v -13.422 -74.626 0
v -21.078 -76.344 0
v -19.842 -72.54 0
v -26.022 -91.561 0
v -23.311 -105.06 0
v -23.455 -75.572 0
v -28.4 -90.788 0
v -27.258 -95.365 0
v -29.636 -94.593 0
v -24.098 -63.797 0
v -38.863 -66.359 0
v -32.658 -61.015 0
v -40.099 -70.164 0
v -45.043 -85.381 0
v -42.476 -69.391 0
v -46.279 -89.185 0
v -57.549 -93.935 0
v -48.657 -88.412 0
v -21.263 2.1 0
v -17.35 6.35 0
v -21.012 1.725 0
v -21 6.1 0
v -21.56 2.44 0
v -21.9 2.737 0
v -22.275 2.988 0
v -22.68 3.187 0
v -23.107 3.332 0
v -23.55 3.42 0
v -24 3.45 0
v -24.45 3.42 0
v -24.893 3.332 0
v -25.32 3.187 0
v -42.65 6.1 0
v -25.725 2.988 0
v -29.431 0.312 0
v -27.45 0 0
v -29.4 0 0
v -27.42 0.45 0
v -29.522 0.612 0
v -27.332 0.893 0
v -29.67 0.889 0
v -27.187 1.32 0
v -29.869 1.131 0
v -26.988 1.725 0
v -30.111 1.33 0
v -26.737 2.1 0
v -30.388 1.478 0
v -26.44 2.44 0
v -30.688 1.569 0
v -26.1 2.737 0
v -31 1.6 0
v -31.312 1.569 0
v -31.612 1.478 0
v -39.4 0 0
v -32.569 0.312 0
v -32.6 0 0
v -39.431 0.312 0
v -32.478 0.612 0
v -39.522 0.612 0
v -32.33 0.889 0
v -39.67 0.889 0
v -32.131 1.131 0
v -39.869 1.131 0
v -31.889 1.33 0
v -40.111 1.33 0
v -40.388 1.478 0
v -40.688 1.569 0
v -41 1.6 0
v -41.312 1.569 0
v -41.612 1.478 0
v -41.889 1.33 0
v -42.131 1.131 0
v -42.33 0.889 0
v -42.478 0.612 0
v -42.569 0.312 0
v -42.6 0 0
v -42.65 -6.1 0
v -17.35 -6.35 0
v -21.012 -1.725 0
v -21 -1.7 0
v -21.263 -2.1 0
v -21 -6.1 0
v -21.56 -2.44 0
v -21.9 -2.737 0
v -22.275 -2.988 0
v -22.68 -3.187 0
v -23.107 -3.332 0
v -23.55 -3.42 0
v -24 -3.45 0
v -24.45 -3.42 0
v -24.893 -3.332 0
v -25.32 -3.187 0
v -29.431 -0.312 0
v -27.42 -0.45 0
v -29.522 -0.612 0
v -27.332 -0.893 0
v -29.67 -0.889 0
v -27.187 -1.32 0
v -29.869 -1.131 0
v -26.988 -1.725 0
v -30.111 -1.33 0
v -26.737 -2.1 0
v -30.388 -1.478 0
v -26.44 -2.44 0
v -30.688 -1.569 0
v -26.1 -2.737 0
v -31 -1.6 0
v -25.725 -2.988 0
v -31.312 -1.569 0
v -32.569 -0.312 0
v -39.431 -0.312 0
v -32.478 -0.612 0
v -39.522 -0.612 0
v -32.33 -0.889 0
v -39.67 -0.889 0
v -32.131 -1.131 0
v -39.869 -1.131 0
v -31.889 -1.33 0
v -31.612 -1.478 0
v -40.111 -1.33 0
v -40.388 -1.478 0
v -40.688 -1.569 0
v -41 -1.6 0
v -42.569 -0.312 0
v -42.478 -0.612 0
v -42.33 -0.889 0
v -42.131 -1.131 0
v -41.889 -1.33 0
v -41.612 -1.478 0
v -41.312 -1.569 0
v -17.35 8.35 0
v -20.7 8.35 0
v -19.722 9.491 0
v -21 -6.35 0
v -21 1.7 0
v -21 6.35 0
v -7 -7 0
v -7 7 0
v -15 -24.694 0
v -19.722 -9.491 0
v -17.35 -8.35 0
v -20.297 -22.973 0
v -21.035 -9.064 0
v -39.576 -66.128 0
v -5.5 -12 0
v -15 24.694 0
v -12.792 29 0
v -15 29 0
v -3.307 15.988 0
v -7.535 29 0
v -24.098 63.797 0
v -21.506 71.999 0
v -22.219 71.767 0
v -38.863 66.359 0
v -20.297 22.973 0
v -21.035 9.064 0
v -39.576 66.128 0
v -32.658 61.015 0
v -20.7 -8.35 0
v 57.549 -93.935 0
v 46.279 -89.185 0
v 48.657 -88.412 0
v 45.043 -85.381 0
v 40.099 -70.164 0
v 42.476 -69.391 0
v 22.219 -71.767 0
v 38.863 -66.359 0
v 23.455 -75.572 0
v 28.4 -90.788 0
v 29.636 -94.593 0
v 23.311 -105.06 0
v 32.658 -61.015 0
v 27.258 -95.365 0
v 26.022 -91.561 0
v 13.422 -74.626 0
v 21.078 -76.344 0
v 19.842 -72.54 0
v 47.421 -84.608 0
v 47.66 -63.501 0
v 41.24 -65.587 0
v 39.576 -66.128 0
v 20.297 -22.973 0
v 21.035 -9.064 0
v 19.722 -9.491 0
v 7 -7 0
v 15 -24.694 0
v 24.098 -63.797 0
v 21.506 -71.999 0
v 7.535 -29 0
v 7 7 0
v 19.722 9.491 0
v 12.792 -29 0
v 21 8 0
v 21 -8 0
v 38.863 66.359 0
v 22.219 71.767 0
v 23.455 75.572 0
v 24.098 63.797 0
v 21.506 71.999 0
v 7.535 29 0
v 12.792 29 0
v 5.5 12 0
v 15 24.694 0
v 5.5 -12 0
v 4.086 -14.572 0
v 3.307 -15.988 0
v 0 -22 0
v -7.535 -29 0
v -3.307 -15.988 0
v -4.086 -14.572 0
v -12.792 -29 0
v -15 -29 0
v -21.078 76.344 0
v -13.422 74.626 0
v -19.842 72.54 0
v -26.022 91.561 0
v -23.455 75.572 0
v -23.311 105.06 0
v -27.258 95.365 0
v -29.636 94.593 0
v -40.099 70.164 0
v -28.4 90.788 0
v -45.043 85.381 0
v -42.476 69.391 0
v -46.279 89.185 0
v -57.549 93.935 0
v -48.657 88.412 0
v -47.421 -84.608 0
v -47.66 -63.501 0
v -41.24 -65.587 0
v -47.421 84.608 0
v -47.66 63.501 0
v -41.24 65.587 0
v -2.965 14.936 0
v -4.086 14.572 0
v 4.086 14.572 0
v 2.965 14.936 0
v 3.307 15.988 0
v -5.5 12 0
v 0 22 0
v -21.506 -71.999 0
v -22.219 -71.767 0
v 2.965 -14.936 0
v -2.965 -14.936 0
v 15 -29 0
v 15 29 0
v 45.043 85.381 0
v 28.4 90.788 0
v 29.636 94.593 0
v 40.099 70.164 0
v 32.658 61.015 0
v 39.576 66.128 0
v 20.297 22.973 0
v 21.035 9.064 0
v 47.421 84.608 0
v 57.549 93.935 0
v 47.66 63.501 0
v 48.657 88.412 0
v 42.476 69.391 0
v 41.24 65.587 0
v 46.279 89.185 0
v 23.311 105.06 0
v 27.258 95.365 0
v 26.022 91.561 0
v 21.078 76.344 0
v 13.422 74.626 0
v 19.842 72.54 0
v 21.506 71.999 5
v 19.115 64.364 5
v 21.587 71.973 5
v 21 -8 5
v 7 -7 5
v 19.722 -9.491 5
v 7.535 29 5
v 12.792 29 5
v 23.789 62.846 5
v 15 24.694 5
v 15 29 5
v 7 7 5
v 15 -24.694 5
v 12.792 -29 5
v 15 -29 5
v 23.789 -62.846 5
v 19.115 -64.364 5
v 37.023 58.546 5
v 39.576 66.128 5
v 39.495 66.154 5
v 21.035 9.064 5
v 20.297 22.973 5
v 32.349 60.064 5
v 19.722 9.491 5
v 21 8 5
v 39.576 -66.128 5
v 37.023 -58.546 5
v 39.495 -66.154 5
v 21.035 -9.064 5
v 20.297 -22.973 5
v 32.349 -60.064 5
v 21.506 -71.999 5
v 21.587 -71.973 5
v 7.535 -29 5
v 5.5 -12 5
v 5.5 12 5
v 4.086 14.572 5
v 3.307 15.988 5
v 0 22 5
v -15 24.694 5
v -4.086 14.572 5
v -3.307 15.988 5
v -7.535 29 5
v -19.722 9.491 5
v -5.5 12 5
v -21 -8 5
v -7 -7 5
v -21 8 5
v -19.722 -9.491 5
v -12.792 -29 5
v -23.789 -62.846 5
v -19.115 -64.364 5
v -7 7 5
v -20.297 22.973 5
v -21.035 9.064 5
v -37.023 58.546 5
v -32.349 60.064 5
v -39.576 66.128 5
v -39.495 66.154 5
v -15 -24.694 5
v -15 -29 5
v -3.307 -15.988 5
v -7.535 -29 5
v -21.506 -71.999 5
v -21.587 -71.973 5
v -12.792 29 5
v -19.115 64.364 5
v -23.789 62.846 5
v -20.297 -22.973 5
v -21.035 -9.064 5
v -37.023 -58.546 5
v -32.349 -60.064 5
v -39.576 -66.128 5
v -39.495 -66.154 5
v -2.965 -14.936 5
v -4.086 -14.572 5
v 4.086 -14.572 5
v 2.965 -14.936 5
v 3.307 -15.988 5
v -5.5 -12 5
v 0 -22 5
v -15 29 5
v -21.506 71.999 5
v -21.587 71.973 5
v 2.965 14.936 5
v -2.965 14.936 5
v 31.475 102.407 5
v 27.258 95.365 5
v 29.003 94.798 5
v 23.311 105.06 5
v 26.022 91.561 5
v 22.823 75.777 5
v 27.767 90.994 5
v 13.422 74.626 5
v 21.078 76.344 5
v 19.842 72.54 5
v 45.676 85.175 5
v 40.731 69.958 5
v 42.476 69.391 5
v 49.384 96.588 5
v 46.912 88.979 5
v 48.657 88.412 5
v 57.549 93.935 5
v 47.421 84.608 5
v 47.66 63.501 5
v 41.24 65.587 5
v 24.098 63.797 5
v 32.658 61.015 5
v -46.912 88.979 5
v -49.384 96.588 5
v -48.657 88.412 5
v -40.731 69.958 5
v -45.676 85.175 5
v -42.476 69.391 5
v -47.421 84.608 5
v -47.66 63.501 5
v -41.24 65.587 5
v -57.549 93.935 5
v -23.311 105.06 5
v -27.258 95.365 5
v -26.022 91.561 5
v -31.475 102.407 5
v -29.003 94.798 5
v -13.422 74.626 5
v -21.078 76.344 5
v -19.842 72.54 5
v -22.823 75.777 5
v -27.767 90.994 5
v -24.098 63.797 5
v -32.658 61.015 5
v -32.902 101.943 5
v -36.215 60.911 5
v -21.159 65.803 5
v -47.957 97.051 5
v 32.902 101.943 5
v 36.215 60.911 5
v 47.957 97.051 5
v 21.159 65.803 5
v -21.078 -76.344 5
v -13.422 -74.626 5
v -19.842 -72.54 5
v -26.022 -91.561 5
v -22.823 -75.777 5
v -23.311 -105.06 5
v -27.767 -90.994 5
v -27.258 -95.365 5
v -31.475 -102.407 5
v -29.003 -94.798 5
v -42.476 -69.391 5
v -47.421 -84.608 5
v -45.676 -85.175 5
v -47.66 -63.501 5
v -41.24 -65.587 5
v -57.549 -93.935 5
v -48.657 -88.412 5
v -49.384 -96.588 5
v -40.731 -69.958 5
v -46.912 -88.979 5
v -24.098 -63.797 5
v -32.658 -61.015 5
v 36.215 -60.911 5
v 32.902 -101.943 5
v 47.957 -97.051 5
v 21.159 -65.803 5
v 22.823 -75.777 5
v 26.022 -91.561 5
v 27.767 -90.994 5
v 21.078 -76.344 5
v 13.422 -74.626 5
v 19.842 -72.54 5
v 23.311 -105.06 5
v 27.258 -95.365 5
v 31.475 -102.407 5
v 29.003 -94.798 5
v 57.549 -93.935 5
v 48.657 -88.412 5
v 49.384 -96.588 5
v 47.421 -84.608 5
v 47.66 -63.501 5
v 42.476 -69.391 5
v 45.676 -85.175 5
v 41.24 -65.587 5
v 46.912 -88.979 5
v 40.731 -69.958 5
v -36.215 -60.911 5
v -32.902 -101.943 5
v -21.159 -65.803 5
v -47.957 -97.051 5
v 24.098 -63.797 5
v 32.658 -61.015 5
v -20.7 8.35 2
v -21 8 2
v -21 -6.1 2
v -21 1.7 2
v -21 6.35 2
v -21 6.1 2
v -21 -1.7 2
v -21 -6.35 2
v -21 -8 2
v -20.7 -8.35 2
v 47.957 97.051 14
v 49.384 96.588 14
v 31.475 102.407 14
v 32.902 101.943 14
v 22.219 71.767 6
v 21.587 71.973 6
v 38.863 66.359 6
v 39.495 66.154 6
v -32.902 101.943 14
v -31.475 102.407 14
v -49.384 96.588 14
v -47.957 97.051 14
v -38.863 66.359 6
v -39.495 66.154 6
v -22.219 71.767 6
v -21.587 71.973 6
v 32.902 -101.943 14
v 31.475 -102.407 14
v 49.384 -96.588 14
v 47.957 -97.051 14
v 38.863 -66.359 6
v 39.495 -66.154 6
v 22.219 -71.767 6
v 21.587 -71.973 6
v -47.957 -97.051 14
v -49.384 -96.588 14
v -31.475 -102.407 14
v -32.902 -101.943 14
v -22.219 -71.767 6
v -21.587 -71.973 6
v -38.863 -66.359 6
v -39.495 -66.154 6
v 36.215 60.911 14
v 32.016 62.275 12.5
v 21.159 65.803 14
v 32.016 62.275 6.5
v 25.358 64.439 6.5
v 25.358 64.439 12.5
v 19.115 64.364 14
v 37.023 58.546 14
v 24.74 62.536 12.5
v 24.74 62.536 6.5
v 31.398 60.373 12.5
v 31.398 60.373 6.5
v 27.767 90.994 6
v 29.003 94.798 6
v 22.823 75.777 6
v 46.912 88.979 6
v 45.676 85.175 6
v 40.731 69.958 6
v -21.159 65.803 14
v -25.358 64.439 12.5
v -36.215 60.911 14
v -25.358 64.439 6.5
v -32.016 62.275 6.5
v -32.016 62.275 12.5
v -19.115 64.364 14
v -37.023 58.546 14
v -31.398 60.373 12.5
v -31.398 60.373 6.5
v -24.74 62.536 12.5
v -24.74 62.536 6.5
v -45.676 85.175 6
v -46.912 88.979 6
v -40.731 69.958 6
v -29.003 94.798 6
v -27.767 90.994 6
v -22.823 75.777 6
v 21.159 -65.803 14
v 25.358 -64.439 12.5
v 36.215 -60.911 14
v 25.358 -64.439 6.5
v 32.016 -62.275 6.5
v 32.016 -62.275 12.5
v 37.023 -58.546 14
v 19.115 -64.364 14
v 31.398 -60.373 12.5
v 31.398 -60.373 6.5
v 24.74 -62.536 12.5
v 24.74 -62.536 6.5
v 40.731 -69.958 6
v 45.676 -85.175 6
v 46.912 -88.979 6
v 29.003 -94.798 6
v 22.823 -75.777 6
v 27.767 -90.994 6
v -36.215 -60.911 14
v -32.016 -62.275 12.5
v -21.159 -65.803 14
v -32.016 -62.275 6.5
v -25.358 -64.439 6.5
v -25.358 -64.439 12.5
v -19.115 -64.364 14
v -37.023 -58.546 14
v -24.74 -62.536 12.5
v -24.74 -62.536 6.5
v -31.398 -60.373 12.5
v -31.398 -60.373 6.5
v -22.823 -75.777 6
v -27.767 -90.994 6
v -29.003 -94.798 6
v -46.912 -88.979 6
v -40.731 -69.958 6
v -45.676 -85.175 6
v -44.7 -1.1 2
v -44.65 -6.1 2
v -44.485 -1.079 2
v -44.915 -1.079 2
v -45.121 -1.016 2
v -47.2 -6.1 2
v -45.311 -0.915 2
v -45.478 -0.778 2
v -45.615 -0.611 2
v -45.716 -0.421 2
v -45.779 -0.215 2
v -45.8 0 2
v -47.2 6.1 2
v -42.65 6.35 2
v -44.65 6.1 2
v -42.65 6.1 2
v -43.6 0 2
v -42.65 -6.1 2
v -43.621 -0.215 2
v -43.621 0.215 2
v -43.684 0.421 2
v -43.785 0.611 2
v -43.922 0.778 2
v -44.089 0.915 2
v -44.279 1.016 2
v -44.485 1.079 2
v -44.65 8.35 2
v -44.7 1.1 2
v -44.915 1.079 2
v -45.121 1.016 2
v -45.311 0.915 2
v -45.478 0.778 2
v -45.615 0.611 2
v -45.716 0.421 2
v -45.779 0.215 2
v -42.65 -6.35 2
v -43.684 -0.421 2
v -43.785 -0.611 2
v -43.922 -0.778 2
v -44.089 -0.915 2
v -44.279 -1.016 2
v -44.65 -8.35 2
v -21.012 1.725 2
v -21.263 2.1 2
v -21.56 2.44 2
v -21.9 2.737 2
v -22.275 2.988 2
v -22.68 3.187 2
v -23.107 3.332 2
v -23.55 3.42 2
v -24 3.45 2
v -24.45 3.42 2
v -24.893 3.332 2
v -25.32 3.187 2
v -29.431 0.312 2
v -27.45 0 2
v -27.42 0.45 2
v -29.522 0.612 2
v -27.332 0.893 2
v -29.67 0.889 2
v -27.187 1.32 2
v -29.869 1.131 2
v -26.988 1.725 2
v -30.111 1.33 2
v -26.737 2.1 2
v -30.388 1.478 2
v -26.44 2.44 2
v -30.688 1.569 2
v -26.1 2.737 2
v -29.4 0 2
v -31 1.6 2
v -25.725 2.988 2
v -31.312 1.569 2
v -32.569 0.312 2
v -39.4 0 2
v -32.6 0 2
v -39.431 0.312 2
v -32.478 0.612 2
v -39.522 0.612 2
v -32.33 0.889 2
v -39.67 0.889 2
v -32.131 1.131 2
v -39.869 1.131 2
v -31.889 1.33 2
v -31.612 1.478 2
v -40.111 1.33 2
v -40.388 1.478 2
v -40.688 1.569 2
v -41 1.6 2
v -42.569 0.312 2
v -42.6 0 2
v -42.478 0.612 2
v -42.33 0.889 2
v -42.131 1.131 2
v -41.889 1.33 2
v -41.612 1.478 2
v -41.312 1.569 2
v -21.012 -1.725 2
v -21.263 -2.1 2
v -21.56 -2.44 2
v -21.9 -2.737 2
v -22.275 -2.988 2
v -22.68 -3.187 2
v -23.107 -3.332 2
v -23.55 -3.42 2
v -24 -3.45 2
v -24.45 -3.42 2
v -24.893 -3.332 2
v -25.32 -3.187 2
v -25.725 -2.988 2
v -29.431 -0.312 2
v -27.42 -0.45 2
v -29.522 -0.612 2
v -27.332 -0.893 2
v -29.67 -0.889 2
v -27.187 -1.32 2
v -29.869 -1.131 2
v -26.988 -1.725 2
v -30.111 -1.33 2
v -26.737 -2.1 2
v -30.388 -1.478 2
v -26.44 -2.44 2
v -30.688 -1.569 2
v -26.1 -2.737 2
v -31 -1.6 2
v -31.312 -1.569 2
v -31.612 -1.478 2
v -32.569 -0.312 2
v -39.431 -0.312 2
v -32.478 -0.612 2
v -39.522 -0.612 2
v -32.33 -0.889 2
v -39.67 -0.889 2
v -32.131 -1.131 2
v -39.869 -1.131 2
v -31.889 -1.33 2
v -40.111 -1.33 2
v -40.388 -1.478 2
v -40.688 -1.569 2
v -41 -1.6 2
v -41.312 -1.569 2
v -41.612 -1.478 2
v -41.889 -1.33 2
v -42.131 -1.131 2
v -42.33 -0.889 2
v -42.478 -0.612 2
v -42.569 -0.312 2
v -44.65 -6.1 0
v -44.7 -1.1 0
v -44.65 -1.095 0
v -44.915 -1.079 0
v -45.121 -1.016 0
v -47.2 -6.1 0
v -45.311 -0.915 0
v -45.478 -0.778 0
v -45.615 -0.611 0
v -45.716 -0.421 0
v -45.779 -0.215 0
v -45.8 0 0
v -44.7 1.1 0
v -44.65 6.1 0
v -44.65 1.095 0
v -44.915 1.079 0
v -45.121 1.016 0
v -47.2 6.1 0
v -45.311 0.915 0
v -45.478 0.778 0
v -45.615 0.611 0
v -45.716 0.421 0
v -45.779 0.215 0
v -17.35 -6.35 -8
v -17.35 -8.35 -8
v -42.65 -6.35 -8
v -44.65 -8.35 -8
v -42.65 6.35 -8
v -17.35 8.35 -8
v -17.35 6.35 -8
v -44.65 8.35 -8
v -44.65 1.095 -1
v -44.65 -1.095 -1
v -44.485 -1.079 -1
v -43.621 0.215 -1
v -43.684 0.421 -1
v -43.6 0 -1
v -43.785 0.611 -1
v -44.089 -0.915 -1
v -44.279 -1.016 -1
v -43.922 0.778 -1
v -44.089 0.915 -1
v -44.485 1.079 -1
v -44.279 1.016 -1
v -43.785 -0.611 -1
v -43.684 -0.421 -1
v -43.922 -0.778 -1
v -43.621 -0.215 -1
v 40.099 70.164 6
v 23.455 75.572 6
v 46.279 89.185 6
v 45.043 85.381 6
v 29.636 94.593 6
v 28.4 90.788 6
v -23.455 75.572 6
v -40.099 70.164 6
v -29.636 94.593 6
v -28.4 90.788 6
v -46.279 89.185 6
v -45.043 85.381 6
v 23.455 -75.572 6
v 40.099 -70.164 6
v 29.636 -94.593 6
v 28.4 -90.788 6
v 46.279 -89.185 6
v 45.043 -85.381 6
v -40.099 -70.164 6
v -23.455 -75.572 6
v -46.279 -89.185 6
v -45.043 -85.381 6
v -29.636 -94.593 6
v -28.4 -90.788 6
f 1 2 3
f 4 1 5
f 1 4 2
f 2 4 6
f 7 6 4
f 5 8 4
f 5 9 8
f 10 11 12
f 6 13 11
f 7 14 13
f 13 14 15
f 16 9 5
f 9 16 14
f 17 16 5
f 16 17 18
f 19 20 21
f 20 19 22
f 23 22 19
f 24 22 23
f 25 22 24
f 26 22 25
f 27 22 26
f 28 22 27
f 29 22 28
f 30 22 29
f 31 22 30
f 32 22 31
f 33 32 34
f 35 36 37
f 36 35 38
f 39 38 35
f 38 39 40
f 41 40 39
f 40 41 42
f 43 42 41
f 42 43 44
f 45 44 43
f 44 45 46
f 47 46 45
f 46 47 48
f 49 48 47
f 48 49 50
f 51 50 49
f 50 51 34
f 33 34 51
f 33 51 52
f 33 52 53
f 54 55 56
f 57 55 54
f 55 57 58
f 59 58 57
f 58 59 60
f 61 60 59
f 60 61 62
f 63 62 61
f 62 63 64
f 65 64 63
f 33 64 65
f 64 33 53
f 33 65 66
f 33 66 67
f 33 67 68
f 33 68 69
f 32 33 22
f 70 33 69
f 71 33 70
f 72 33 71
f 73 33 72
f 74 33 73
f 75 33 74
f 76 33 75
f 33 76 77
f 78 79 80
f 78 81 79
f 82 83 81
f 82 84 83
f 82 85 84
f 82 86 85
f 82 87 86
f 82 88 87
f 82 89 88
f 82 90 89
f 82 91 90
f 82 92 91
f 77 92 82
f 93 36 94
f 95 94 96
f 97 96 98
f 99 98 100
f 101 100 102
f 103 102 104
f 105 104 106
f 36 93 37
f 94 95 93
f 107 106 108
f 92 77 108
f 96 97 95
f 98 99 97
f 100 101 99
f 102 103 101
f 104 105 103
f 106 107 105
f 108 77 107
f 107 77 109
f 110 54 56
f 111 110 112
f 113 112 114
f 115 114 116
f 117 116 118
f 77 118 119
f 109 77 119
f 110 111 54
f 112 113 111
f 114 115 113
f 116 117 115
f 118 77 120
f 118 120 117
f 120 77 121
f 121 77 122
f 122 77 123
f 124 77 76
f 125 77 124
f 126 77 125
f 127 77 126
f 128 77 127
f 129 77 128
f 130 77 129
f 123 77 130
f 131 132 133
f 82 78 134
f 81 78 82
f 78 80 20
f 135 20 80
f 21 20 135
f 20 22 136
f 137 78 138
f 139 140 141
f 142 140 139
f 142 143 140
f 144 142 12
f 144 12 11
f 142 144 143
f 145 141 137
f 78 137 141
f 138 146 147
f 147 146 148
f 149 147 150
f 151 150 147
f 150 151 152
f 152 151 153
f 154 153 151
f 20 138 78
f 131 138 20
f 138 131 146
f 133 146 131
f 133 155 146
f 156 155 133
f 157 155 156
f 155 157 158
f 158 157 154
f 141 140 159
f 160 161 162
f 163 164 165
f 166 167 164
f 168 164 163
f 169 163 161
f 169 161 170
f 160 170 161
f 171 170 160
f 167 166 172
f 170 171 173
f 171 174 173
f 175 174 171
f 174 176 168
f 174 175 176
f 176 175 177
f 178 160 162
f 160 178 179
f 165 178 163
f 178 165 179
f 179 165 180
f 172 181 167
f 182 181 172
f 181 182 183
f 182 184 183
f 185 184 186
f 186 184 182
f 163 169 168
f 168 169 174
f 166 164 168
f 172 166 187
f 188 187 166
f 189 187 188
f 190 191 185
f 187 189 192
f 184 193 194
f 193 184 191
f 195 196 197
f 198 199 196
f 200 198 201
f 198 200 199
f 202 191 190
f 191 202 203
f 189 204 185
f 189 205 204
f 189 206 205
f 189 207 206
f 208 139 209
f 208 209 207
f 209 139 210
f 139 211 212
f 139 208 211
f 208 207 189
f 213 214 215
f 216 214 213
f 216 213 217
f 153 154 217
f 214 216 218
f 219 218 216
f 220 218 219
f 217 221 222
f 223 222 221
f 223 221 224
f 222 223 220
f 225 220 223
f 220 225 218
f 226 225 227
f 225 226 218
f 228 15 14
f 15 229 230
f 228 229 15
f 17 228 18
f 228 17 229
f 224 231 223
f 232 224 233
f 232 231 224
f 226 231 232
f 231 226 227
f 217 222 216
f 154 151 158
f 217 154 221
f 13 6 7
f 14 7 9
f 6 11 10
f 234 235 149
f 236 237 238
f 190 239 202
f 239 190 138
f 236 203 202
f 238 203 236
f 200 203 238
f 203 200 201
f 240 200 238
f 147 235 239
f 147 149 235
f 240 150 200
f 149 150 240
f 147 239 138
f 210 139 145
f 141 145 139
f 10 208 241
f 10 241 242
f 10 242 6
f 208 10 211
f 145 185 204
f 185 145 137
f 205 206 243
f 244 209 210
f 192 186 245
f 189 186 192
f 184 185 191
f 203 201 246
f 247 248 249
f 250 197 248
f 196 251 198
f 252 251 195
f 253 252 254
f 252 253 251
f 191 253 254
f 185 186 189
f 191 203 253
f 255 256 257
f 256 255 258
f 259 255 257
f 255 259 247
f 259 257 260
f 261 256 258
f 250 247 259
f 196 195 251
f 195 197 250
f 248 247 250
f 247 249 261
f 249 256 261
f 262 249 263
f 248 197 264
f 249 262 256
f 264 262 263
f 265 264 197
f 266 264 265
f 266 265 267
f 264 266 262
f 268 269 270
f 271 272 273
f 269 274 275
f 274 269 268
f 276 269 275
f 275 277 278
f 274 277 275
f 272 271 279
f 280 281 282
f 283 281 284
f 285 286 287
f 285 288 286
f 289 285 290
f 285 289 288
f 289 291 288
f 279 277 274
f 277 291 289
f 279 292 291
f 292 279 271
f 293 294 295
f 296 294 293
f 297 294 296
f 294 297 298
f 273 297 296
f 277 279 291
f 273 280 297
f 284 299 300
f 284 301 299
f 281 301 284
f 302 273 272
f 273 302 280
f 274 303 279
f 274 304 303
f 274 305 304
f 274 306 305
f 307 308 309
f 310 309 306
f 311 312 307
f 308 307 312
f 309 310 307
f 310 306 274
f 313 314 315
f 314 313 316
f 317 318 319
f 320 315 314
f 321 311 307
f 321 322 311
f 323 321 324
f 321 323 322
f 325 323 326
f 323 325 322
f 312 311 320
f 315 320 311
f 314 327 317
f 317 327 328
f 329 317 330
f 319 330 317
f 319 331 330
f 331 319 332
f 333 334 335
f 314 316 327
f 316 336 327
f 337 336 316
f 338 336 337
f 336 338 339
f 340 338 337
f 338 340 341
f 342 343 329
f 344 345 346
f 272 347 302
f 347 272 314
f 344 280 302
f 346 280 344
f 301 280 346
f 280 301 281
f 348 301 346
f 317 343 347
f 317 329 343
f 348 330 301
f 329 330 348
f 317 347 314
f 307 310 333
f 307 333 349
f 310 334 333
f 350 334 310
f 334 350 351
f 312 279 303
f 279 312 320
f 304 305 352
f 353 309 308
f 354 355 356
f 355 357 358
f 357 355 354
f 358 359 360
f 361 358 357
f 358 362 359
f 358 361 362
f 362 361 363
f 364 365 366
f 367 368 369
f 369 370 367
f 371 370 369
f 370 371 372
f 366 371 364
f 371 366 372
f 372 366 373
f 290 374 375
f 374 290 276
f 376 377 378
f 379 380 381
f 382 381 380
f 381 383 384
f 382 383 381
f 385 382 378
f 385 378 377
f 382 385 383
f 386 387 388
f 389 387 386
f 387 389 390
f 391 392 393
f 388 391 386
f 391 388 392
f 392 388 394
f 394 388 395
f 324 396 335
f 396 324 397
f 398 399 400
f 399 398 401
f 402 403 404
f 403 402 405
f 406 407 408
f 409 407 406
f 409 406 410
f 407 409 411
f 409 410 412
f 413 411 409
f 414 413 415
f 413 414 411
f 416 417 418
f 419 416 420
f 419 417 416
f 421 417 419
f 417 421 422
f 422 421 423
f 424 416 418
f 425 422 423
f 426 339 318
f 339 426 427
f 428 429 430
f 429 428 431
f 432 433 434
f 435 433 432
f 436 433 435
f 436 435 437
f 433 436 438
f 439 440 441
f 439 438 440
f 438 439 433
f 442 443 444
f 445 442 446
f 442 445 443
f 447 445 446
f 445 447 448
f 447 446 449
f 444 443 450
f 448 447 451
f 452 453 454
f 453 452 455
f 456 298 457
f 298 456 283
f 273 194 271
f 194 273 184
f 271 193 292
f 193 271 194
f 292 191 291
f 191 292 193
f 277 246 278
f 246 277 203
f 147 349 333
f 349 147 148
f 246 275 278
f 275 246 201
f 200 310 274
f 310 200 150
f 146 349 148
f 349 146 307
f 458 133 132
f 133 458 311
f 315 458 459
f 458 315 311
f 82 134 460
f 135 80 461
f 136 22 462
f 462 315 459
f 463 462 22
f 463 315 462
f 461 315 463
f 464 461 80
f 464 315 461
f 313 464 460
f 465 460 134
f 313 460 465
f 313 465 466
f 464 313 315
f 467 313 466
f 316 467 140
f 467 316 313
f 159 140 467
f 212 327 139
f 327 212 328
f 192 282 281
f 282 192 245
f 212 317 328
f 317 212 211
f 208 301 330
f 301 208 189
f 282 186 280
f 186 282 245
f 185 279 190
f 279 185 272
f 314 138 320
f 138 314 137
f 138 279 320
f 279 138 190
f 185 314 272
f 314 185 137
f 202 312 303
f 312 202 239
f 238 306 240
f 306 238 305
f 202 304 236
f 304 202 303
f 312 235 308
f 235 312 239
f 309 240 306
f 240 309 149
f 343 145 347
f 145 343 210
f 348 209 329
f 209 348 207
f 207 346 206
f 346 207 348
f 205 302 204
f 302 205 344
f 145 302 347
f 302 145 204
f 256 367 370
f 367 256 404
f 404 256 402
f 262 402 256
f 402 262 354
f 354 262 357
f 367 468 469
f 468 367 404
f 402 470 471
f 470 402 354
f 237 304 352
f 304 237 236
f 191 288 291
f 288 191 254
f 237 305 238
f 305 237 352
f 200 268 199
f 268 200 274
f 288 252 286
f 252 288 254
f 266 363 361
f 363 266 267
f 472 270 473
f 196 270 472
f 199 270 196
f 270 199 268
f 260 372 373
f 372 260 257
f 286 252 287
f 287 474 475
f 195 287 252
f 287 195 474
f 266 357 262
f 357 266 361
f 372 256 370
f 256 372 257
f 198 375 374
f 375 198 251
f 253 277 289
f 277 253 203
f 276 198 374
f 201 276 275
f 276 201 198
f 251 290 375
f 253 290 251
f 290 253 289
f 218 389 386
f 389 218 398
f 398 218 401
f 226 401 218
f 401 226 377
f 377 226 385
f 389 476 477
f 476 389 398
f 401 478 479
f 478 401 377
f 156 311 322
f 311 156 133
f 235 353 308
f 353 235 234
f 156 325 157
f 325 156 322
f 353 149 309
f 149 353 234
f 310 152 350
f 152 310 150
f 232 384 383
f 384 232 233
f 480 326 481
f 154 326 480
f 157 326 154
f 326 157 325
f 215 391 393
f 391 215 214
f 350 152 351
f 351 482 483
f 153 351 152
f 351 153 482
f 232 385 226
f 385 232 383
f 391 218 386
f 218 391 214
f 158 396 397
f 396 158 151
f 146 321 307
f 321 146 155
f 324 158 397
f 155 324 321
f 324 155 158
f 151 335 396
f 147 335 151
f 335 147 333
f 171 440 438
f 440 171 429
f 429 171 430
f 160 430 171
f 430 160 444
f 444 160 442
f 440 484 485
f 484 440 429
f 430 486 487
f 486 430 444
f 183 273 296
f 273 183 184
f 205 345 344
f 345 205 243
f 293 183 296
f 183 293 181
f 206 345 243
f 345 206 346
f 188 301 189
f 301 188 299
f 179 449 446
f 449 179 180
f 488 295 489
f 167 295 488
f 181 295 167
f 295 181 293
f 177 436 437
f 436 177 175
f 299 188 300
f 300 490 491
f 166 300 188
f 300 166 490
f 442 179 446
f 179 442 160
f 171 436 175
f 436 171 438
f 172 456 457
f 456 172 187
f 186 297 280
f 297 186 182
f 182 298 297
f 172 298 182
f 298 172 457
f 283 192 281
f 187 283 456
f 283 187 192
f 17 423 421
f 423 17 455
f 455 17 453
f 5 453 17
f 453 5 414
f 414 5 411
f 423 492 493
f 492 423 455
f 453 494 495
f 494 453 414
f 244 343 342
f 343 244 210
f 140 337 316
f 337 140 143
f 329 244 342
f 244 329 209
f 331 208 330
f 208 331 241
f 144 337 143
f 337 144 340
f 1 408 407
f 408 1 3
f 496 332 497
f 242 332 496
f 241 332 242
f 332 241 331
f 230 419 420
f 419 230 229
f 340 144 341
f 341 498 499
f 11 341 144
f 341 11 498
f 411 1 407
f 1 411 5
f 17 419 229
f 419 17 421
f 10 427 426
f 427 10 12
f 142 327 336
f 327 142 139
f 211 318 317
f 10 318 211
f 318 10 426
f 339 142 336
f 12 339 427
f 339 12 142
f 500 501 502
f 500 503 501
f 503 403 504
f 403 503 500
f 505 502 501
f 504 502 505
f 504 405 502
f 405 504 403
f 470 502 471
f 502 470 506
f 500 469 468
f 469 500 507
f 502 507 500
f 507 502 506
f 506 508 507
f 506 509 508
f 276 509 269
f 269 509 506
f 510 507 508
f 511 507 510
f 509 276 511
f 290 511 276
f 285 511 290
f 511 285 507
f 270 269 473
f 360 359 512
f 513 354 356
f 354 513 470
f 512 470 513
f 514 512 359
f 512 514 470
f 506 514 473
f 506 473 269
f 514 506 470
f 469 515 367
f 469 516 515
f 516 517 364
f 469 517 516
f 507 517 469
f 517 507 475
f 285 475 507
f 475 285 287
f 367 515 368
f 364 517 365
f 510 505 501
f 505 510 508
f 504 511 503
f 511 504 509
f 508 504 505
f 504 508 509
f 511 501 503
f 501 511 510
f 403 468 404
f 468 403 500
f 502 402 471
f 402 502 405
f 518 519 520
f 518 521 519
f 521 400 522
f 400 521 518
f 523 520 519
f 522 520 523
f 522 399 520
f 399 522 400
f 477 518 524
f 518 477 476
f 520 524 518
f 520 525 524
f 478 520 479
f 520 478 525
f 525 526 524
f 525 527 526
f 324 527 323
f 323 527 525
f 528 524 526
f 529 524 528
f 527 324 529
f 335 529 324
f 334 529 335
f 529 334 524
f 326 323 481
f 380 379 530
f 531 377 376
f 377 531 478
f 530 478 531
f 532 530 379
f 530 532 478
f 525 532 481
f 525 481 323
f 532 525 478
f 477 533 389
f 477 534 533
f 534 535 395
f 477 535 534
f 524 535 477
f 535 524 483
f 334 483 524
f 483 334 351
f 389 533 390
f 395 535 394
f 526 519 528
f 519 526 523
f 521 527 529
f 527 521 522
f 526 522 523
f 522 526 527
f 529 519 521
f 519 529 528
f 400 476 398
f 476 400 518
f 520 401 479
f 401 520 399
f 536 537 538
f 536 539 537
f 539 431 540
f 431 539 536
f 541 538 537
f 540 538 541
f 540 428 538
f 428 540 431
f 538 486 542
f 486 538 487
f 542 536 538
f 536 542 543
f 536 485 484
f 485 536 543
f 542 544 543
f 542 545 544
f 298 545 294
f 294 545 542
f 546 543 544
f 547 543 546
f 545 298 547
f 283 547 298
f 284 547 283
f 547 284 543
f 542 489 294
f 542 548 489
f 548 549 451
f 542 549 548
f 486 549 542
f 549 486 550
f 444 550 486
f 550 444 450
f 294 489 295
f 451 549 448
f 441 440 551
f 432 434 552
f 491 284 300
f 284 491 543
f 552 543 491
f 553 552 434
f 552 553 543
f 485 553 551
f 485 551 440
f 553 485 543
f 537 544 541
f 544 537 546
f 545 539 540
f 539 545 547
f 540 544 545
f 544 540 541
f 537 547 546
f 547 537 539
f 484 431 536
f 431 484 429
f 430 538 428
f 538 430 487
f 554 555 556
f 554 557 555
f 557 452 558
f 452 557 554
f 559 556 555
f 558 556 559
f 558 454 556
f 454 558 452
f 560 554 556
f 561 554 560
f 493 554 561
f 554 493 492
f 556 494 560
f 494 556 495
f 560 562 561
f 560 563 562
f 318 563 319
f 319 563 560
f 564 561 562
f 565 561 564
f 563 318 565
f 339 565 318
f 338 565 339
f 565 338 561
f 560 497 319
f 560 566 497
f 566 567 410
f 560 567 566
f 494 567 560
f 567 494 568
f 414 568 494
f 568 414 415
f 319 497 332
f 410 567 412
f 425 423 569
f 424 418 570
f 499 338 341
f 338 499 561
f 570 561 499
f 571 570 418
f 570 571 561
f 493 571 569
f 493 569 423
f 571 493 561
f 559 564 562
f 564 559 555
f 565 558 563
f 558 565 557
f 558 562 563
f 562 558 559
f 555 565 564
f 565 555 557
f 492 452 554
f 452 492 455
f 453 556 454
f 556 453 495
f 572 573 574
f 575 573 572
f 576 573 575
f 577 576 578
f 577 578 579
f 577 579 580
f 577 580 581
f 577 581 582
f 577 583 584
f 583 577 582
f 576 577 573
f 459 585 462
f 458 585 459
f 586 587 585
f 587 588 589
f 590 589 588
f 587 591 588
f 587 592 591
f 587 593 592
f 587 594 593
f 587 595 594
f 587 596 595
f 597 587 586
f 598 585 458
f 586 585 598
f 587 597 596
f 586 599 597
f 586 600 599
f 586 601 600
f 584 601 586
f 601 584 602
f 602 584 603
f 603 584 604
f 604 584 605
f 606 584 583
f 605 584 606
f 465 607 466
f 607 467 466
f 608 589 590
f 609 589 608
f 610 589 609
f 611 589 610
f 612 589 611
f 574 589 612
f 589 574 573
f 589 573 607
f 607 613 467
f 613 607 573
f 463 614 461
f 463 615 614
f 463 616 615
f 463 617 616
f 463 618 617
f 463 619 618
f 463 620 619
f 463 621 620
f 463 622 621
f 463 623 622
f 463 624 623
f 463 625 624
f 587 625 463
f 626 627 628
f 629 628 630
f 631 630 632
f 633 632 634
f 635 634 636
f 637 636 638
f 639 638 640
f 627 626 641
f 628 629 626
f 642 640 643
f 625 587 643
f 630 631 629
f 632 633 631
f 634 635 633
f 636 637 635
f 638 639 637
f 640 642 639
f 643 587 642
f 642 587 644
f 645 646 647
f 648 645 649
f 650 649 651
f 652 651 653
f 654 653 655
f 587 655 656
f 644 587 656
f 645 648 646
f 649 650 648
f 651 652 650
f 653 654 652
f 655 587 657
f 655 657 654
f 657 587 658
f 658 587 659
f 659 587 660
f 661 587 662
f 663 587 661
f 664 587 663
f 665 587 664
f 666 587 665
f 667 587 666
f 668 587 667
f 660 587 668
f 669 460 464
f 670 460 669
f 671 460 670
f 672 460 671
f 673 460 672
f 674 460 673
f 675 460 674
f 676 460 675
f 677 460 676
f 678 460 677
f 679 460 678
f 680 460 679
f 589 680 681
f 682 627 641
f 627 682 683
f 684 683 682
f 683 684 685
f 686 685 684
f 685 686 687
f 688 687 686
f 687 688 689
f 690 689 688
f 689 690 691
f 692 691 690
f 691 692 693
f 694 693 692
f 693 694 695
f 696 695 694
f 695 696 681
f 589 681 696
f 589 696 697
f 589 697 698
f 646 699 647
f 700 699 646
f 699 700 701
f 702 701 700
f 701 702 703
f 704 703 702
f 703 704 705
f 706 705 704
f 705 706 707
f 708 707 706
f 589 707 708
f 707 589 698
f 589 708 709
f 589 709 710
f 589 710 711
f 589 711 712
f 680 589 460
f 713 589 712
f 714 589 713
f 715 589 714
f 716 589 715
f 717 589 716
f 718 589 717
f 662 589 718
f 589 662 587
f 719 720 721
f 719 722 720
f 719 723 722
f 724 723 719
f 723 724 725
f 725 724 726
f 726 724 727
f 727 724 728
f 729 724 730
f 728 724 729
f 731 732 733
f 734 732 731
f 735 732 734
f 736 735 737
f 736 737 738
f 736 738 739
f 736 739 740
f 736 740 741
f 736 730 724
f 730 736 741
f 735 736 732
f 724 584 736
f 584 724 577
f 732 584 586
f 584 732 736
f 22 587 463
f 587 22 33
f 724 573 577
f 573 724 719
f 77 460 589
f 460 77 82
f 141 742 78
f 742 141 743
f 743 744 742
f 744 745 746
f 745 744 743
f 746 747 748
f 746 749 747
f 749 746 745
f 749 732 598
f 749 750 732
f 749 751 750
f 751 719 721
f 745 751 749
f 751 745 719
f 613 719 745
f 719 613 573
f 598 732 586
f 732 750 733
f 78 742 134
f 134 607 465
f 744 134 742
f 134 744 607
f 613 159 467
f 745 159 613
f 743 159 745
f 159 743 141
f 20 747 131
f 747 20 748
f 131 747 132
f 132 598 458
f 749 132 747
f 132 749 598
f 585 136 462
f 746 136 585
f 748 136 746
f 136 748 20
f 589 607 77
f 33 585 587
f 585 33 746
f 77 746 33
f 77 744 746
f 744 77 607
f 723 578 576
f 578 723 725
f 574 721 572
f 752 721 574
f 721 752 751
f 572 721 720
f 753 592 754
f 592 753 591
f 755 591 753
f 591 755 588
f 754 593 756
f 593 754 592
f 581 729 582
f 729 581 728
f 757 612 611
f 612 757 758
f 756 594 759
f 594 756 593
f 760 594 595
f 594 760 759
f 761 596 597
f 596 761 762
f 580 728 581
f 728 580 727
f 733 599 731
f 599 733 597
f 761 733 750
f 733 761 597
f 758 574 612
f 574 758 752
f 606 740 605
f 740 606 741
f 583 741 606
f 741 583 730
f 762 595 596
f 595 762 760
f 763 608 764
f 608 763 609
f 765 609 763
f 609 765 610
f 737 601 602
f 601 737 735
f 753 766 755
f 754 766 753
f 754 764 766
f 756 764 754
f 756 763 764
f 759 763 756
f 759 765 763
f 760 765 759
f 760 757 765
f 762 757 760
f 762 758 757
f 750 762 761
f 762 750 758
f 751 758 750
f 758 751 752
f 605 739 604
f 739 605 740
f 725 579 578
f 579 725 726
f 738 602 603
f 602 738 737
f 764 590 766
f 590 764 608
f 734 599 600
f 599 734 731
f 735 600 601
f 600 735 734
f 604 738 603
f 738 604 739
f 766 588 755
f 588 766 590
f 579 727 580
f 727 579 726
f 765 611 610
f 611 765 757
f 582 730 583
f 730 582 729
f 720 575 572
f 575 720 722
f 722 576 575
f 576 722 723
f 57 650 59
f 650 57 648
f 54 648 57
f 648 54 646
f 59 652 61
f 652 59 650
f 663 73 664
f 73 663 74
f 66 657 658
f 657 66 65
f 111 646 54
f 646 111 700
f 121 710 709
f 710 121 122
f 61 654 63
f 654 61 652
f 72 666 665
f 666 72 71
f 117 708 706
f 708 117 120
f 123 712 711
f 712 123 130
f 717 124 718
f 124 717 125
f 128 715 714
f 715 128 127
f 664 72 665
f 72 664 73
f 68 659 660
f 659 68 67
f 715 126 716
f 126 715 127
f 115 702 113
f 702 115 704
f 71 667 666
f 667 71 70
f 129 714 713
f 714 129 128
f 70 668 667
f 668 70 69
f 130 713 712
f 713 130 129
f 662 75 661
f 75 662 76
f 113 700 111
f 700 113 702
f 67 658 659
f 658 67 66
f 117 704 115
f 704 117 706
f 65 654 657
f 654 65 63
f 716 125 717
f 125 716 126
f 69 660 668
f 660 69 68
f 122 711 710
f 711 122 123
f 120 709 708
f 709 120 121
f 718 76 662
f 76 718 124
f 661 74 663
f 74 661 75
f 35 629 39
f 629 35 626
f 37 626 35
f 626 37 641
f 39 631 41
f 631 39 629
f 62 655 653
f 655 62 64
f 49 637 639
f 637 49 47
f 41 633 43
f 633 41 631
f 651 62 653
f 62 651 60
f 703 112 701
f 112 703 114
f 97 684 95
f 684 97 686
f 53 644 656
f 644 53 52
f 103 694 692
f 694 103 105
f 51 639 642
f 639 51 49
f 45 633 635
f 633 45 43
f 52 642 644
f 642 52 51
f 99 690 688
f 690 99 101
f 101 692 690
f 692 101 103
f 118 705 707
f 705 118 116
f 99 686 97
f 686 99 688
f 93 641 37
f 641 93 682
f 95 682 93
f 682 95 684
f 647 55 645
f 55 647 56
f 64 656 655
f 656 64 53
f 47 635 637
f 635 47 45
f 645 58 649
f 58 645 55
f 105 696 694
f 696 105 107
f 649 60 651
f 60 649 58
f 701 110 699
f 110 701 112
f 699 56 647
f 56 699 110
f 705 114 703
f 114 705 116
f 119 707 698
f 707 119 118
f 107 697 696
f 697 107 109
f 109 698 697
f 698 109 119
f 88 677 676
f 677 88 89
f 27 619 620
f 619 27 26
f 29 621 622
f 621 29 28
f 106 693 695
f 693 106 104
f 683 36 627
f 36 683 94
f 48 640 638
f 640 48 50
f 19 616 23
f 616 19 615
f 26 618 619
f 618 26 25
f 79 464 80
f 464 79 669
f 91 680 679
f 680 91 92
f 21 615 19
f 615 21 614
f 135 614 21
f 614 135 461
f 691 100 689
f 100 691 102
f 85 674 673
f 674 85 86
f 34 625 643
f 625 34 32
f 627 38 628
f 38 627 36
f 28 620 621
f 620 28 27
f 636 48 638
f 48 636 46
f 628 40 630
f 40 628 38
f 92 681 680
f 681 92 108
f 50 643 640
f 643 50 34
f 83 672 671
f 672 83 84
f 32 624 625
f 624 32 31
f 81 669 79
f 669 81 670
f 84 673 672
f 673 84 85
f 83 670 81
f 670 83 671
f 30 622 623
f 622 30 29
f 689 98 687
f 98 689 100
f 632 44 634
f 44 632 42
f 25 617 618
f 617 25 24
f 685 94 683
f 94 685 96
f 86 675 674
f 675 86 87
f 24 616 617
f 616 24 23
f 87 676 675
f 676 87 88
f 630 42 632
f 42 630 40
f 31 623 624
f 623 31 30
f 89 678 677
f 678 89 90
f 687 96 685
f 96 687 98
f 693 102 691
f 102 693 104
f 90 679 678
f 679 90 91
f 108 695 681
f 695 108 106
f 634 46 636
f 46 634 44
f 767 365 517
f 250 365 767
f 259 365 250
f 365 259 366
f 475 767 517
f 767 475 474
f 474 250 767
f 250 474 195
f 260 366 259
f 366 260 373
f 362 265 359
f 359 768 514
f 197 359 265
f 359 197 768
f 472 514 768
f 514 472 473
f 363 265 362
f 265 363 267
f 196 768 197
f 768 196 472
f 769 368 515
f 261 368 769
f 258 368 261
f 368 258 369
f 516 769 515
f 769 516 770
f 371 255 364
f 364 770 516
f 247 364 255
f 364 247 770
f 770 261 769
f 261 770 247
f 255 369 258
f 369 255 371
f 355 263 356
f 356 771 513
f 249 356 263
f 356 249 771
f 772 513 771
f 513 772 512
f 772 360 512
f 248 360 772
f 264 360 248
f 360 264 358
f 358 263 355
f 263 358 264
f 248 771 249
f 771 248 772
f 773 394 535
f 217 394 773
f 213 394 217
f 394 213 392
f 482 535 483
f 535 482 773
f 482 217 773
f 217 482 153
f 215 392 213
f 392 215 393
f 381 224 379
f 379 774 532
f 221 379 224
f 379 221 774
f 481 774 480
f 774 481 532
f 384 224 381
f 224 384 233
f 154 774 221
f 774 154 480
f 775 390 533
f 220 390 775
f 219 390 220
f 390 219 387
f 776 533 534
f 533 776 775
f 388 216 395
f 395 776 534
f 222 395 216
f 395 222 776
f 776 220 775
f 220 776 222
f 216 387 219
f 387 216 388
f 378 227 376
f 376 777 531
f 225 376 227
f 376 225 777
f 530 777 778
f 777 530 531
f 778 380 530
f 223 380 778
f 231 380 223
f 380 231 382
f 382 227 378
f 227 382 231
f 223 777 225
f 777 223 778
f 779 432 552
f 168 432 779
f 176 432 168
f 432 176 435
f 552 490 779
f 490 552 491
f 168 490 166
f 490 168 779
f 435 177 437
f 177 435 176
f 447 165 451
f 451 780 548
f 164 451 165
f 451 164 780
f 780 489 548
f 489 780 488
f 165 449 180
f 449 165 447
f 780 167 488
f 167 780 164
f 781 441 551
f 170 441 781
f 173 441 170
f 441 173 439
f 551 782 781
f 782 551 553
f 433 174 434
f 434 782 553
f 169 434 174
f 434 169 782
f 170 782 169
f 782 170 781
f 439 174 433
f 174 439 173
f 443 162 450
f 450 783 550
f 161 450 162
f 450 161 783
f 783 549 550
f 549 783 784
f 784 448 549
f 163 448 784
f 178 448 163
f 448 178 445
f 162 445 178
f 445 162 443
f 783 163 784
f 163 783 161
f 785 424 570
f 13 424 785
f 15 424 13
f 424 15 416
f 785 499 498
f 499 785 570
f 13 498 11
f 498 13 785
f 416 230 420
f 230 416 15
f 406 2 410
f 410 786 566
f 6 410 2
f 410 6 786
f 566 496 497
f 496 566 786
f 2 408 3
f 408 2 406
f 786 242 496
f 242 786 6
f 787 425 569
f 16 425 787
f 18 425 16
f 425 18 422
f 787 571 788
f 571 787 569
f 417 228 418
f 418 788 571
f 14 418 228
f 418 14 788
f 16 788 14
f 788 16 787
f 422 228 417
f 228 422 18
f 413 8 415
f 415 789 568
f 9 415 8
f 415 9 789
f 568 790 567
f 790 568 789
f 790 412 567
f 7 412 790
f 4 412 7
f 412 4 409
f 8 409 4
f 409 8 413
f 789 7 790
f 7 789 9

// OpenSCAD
// Project Grace V2 - printed skeleton with an underside MG90S servo cradle.
// Dimensions are in millimetres. ProjectGrace.scad remains the preserved V1.

// Set to "motor_reference" or "servo_reference" to inspect component envelopes.
view_mode = "skeleton";

// IMechE External Pipe Climber brief: commercial 22 mm copper pipe.
// A 2 mm undersize wheel gap preloads the tyres against the pipe for grip.
pipe_outer_diameter = 22;
wheel_gap_undersize = 2;
target_wheel_gap = pipe_outer_diameter - wheel_gap_undersize;

frame_thickness = 5;

// Central body.
center_width = 30;
center_height = 58;
center_opening_size = 14;
triangle_opening_width = 11;
triangle_opening_height = 10;

// Four identical arms and their solid motor-mount pads.
arm_length = 92;
arm_width = 19;
arm_slot_width = 9;
arm_slot_start = 13;
arm_slot_end_clearance = 7;
end_pad_length = 32;
end_pad_width = 36;
arm_angle = 72;

// Measured N20-style micro metal gearmotor envelope from the supplied photos.
// The total length includes the output shaft; the individual can and gearbox lengths are estimates.
motor_overall_length = 46.05;
motor_width = 15.23;
motor_thickness = 11.82;
motor_can_length = 22;
gearbox_length = 16;
output_shaft_length = motor_overall_length - motor_can_length - gearbox_length;
output_shaft_diameter = 3;

// Integrated holder dimensions. The motor sits directly on the frame surface.
motor_fit_clearance = 0.6;
holder_wall_thickness = 1.5;
holder_wall_height = 9;
holder_back_stop_thickness = 2;
holder_length = motor_can_length + gearbox_length + 2;
wire_exit_width = 7;
wire_exit_height = 6;
cable_tie_slot_width = 2.5;
cable_tie_slot_length = 4;
cable_tie_slot_positions = [10, 30];
cable_tie_slot_y = 10;

// MG90S micro-servo dimensions. Verify the tab-hole spacing on the supplied servo.
servo_body_length = 22.8;
servo_body_width = 12.2;
servo_body_height = 28.5;
servo_fit_clearance = 0.5;
servo_ear_length = 32.4;
servo_ear_width = 12.2;
servo_ear_thickness = 2.5;
servo_ear_height_from_spline = 19;
servo_mount_hole_diameter = 2.2;
servo_mount_hole_spacing = 27.4;
servo_cradle_wall_thickness = 2;
servo_cradle_wall_height = 10;
servo_cradle_floor_thickness = 2;
servo_spline_diameter = 4.9;
servo_spline_projection = 4;
servo_spline_x_offset = 7;
servo_cradle_center_x = -31;
servo_cradle_mount_z = servo_cradle_floor_thickness;
servo_inner_bracket_hole_diameter = 3.2;
servo_inner_bracket_hole_positions = [-10, 0, 10];

module arm_with_pad(root_x, root_y, angle) {
    arm_slot_length = arm_length - end_pad_length - arm_slot_start - arm_slot_end_clearance;

    translate([root_x, root_y, 0])
        rotate([0, 0, angle])
            difference() {
                union() {
                    translate([0, -arm_width / 2, 0])
                        cube([arm_length, arm_width, frame_thickness]);
                    translate([arm_length - end_pad_length, -end_pad_width / 2, 0])
                        cube([end_pad_length, end_pad_width, frame_thickness]);
                }

                // Long lightening slot, matching the reference skeleton.
                translate([arm_slot_start, -arm_slot_width / 2, -1])
                    cube([arm_slot_length, arm_slot_width, frame_thickness + 2]);
            }
}

module triangular_opening(y_position, points_up) {
    translate([0, y_position, -1])
        linear_extrude(height = frame_thickness + 2)
            if (points_up)
                polygon(points = [
                    [-triangle_opening_width / 2, -triangle_opening_height / 2],
                    [triangle_opening_width / 2, -triangle_opening_height / 2],
                    [0, triangle_opening_height / 2]
                ]);
            else
                polygon(points = [
                    [-triangle_opening_width / 2, triangle_opening_height / 2],
                    [triangle_opening_width / 2, triangle_opening_height / 2],
                    [0, -triangle_opening_height / 2]
                ]);
}

module center_body() {
    difference() {
        linear_extrude(height = frame_thickness)
            polygon(points = [
                [-center_width / 2, -center_height / 2],
                [center_width / 2, -center_height / 2],
                [center_width / 2, -center_height / 2 + 14],
                [center_width / 2 + 6, -8],
                [center_width / 2 + 6, 8],
                [center_width / 2, center_height / 2 - 14],
                [center_width / 2, center_height / 2],
                [-center_width / 2, center_height / 2],
                [-center_width / 2, center_height / 2 - 14],
                [-center_width / 2 - 6, 8],
                [-center_width / 2 - 6, -8],
                [-center_width / 2, -center_height / 2 + 14]
            ]);

        translate([-center_opening_size / 2, -center_opening_size / 2, -1])
            cube([center_opening_size, center_opening_size, frame_thickness + 2]);
        triangular_opening(center_opening_size / 2 + triangle_opening_height, true);
        triangular_opening(-center_opening_size / 2 - triangle_opening_height, false);
    }
}

module motor_holder() {
    holder_outer_width = motor_width + motor_fit_clearance + 2 * holder_wall_thickness;

    union() {
        // Rear stop prevents the motor moving towards the centre of the frame.
        difference() {
            translate([0, -holder_outer_width / 2, 0])
                cube([holder_back_stop_thickness, holder_outer_width, holder_wall_height]);
            translate([
                -1,
                -wire_exit_width / 2,
                (holder_wall_height - wire_exit_height) / 2
            ])
                cube([holder_back_stop_thickness + 2, wire_exit_width, wire_exit_height]);
        }

        // Low rails locate the compound motor without interfering with its gearbox or shaft.
        translate([0, -holder_outer_width / 2, 0])
            cube([holder_length, holder_wall_thickness, holder_wall_height]);
        translate([0, holder_outer_width / 2 - holder_wall_thickness, 0])
            cube([holder_length, holder_wall_thickness, holder_wall_height]);
    }
}

module motor_holder_tie_slots() {
    // Two tie stations prevent the motor rotating in its holder under drive torque.
    for (tie_x = cable_tie_slot_positions)
        for (side = [-1, 1])
            translate([
                tie_x - cable_tie_slot_length / 2,
                side * cable_tie_slot_y - cable_tie_slot_width / 2,
                -1
            ])
                cube([cable_tie_slot_length, cable_tie_slot_width, frame_thickness + 2]);
}

module holder_on_arm(root_x, root_y, angle) {
    translate([root_x, root_y, frame_thickness])
        rotate([0, 0, angle])
            translate([arm_length - holder_length, 0, 0])
                motor_holder();
}

module holder_slots_on_arm(root_x, root_y, angle) {
    translate([root_x, root_y, 0])
        rotate([0, 0, angle])
            translate([arm_length - holder_length, 0, 0])
                motor_holder_tie_slots();
}

module servo_cradle() {
    cradle_inner_length = servo_body_length + servo_fit_clearance;
    cradle_inner_width = servo_body_width + servo_fit_clearance;
    cradle_outer_length = cradle_inner_length + 2 * servo_cradle_wall_thickness;
    cradle_outer_width = cradle_inner_width + 2 * servo_cradle_wall_thickness;
    ear_hole_x = servo_mount_hole_spacing / 2;

    // Side-mounted under-frame tray: the servo spline and ChainHookHorn face downward.
    difference() {
        union() {
            // The wide plate carries the servo's two mounting ears.
            translate([-servo_ear_length / 2, -servo_ear_width / 2, -servo_cradle_floor_thickness])
                cube([servo_ear_length, servo_ear_width, servo_cradle_floor_thickness]);

            // Low side rails locate the body in the cradle without covering its output end.
            translate([
                -cradle_outer_length / 2,
                -cradle_outer_width / 2,
                -servo_cradle_wall_height
            ])
                cube([
                    cradle_outer_length,
                    servo_cradle_wall_thickness,
                    servo_cradle_wall_height
                ]);
            translate([
                -cradle_outer_length / 2,
                cradle_outer_width / 2 - servo_cradle_wall_thickness,
                -servo_cradle_wall_height
            ])
                cube([
                    cradle_outer_length,
                    servo_cradle_wall_thickness,
                    servo_cradle_wall_height
                ]);

            // Outer end stop keeps the servo located against drive vibration.
            translate([
                -cradle_outer_length / 2,
                -cradle_outer_width / 2,
                -servo_cradle_wall_height
            ])
                cube([
                    servo_cradle_wall_thickness,
                    cradle_outer_width,
                    servo_cradle_wall_height
                ]);
        }

        // Opening under the spline lets the servo horn and chain hook run freely.
        translate([servo_spline_x_offset, 0, -servo_cradle_floor_thickness - 1])
            cylinder(d = servo_spline_diameter + 2, h = servo_cradle_floor_thickness + 2, $fn = 48);

        // M2 through-holes align with the MG90S mounting ears.
        for (x_position = [-ear_hole_x, ear_hole_x])
            translate([x_position, 0, -servo_cradle_floor_thickness - 1])
                cylinder(d = servo_mount_hole_diameter, h = servo_cradle_floor_thickness + 2, $fn = 32);

        // Three clearance holes sit in the inner bracket where shown in the concept sketch.
        for (x_position = servo_inner_bracket_hole_positions)
            translate([x_position, 0, -servo_cradle_floor_thickness - 1])
                cylinder(
                    d = servo_inner_bracket_hole_diameter,
                    h = servo_cradle_floor_thickness + 2,
                    $fn = 32
                );
    }
}

module printed_skeleton() {
    difference() {
        union() {
            center_body();
            arm_with_pad(center_width / 2 - 3, center_height / 2 - 17, arm_angle);
            arm_with_pad(-center_width / 2 + 3, center_height / 2 - 17, 180 - arm_angle);
            arm_with_pad(center_width / 2 - 3, -center_height / 2 + 17, -arm_angle);
            arm_with_pad(-center_width / 2 + 3, -center_height / 2 + 17, arm_angle - 180);
            holder_on_arm(center_width / 2 - 3, center_height / 2 - 17, arm_angle);
            holder_on_arm(-center_width / 2 + 3, center_height / 2 - 17, 180 - arm_angle);
            holder_on_arm(center_width / 2 - 3, -center_height / 2 + 17, -arm_angle);
            holder_on_arm(-center_width / 2 + 3, -center_height / 2 + 17, arm_angle - 180);
            // The floor overlaps the chassis by 2 mm, making the side cradle one printed part.
            translate([servo_cradle_center_x, 0, servo_cradle_mount_z])
                servo_cradle();
        }

        holder_slots_on_arm(center_width / 2 - 3, center_height / 2 - 17, arm_angle);
        holder_slots_on_arm(-center_width / 2 + 3, center_height / 2 - 17, 180 - arm_angle);
        holder_slots_on_arm(center_width / 2 - 3, -center_height / 2 + 17, -arm_angle);
        holder_slots_on_arm(-center_width / 2 + 3, -center_height / 2 + 17, arm_angle - 180);
    }
}

module compound_motor_reference() {
    // Motor can, gearbox, and output shaft are separate volumes for mount design.
    color("silver")
        translate([0, -motor_width / 2, -motor_thickness / 2])
            cube([motor_can_length, motor_width, motor_thickness]);

    color("goldenrod")
        translate([motor_can_length, -motor_width / 2, -motor_thickness / 2])
            cube([gearbox_length, motor_width, motor_thickness]);

    color("dimgray")
        translate([motor_can_length + gearbox_length, 0, 0])
            rotate([0, 90, 0])
                cylinder(d = output_shaft_diameter, h = output_shaft_length);
}

module mg90s_reference() {
    // Approximate orientation inside the side-mounted underside cradle.
    color("royalblue")
        translate([
            servo_cradle_center_x - servo_body_length / 2,
            -servo_body_width / 2,
            servo_cradle_mount_z - servo_body_height
        ])
            cube([servo_body_length, servo_body_width, servo_body_height]);

    color("dimgray")
        translate([
            servo_cradle_center_x + servo_spline_x_offset,
            0,
            servo_cradle_mount_z - servo_body_height - servo_spline_projection
        ])
            cylinder(d = servo_spline_diameter, h = servo_spline_projection, $fn = 48);
}

if (view_mode == "motor_reference")
    compound_motor_reference();
else if (view_mode == "servo_reference") {
    color("orange")
        printed_skeleton();
    mg90s_reference();
} else
    color("orange")
        printed_skeleton();
